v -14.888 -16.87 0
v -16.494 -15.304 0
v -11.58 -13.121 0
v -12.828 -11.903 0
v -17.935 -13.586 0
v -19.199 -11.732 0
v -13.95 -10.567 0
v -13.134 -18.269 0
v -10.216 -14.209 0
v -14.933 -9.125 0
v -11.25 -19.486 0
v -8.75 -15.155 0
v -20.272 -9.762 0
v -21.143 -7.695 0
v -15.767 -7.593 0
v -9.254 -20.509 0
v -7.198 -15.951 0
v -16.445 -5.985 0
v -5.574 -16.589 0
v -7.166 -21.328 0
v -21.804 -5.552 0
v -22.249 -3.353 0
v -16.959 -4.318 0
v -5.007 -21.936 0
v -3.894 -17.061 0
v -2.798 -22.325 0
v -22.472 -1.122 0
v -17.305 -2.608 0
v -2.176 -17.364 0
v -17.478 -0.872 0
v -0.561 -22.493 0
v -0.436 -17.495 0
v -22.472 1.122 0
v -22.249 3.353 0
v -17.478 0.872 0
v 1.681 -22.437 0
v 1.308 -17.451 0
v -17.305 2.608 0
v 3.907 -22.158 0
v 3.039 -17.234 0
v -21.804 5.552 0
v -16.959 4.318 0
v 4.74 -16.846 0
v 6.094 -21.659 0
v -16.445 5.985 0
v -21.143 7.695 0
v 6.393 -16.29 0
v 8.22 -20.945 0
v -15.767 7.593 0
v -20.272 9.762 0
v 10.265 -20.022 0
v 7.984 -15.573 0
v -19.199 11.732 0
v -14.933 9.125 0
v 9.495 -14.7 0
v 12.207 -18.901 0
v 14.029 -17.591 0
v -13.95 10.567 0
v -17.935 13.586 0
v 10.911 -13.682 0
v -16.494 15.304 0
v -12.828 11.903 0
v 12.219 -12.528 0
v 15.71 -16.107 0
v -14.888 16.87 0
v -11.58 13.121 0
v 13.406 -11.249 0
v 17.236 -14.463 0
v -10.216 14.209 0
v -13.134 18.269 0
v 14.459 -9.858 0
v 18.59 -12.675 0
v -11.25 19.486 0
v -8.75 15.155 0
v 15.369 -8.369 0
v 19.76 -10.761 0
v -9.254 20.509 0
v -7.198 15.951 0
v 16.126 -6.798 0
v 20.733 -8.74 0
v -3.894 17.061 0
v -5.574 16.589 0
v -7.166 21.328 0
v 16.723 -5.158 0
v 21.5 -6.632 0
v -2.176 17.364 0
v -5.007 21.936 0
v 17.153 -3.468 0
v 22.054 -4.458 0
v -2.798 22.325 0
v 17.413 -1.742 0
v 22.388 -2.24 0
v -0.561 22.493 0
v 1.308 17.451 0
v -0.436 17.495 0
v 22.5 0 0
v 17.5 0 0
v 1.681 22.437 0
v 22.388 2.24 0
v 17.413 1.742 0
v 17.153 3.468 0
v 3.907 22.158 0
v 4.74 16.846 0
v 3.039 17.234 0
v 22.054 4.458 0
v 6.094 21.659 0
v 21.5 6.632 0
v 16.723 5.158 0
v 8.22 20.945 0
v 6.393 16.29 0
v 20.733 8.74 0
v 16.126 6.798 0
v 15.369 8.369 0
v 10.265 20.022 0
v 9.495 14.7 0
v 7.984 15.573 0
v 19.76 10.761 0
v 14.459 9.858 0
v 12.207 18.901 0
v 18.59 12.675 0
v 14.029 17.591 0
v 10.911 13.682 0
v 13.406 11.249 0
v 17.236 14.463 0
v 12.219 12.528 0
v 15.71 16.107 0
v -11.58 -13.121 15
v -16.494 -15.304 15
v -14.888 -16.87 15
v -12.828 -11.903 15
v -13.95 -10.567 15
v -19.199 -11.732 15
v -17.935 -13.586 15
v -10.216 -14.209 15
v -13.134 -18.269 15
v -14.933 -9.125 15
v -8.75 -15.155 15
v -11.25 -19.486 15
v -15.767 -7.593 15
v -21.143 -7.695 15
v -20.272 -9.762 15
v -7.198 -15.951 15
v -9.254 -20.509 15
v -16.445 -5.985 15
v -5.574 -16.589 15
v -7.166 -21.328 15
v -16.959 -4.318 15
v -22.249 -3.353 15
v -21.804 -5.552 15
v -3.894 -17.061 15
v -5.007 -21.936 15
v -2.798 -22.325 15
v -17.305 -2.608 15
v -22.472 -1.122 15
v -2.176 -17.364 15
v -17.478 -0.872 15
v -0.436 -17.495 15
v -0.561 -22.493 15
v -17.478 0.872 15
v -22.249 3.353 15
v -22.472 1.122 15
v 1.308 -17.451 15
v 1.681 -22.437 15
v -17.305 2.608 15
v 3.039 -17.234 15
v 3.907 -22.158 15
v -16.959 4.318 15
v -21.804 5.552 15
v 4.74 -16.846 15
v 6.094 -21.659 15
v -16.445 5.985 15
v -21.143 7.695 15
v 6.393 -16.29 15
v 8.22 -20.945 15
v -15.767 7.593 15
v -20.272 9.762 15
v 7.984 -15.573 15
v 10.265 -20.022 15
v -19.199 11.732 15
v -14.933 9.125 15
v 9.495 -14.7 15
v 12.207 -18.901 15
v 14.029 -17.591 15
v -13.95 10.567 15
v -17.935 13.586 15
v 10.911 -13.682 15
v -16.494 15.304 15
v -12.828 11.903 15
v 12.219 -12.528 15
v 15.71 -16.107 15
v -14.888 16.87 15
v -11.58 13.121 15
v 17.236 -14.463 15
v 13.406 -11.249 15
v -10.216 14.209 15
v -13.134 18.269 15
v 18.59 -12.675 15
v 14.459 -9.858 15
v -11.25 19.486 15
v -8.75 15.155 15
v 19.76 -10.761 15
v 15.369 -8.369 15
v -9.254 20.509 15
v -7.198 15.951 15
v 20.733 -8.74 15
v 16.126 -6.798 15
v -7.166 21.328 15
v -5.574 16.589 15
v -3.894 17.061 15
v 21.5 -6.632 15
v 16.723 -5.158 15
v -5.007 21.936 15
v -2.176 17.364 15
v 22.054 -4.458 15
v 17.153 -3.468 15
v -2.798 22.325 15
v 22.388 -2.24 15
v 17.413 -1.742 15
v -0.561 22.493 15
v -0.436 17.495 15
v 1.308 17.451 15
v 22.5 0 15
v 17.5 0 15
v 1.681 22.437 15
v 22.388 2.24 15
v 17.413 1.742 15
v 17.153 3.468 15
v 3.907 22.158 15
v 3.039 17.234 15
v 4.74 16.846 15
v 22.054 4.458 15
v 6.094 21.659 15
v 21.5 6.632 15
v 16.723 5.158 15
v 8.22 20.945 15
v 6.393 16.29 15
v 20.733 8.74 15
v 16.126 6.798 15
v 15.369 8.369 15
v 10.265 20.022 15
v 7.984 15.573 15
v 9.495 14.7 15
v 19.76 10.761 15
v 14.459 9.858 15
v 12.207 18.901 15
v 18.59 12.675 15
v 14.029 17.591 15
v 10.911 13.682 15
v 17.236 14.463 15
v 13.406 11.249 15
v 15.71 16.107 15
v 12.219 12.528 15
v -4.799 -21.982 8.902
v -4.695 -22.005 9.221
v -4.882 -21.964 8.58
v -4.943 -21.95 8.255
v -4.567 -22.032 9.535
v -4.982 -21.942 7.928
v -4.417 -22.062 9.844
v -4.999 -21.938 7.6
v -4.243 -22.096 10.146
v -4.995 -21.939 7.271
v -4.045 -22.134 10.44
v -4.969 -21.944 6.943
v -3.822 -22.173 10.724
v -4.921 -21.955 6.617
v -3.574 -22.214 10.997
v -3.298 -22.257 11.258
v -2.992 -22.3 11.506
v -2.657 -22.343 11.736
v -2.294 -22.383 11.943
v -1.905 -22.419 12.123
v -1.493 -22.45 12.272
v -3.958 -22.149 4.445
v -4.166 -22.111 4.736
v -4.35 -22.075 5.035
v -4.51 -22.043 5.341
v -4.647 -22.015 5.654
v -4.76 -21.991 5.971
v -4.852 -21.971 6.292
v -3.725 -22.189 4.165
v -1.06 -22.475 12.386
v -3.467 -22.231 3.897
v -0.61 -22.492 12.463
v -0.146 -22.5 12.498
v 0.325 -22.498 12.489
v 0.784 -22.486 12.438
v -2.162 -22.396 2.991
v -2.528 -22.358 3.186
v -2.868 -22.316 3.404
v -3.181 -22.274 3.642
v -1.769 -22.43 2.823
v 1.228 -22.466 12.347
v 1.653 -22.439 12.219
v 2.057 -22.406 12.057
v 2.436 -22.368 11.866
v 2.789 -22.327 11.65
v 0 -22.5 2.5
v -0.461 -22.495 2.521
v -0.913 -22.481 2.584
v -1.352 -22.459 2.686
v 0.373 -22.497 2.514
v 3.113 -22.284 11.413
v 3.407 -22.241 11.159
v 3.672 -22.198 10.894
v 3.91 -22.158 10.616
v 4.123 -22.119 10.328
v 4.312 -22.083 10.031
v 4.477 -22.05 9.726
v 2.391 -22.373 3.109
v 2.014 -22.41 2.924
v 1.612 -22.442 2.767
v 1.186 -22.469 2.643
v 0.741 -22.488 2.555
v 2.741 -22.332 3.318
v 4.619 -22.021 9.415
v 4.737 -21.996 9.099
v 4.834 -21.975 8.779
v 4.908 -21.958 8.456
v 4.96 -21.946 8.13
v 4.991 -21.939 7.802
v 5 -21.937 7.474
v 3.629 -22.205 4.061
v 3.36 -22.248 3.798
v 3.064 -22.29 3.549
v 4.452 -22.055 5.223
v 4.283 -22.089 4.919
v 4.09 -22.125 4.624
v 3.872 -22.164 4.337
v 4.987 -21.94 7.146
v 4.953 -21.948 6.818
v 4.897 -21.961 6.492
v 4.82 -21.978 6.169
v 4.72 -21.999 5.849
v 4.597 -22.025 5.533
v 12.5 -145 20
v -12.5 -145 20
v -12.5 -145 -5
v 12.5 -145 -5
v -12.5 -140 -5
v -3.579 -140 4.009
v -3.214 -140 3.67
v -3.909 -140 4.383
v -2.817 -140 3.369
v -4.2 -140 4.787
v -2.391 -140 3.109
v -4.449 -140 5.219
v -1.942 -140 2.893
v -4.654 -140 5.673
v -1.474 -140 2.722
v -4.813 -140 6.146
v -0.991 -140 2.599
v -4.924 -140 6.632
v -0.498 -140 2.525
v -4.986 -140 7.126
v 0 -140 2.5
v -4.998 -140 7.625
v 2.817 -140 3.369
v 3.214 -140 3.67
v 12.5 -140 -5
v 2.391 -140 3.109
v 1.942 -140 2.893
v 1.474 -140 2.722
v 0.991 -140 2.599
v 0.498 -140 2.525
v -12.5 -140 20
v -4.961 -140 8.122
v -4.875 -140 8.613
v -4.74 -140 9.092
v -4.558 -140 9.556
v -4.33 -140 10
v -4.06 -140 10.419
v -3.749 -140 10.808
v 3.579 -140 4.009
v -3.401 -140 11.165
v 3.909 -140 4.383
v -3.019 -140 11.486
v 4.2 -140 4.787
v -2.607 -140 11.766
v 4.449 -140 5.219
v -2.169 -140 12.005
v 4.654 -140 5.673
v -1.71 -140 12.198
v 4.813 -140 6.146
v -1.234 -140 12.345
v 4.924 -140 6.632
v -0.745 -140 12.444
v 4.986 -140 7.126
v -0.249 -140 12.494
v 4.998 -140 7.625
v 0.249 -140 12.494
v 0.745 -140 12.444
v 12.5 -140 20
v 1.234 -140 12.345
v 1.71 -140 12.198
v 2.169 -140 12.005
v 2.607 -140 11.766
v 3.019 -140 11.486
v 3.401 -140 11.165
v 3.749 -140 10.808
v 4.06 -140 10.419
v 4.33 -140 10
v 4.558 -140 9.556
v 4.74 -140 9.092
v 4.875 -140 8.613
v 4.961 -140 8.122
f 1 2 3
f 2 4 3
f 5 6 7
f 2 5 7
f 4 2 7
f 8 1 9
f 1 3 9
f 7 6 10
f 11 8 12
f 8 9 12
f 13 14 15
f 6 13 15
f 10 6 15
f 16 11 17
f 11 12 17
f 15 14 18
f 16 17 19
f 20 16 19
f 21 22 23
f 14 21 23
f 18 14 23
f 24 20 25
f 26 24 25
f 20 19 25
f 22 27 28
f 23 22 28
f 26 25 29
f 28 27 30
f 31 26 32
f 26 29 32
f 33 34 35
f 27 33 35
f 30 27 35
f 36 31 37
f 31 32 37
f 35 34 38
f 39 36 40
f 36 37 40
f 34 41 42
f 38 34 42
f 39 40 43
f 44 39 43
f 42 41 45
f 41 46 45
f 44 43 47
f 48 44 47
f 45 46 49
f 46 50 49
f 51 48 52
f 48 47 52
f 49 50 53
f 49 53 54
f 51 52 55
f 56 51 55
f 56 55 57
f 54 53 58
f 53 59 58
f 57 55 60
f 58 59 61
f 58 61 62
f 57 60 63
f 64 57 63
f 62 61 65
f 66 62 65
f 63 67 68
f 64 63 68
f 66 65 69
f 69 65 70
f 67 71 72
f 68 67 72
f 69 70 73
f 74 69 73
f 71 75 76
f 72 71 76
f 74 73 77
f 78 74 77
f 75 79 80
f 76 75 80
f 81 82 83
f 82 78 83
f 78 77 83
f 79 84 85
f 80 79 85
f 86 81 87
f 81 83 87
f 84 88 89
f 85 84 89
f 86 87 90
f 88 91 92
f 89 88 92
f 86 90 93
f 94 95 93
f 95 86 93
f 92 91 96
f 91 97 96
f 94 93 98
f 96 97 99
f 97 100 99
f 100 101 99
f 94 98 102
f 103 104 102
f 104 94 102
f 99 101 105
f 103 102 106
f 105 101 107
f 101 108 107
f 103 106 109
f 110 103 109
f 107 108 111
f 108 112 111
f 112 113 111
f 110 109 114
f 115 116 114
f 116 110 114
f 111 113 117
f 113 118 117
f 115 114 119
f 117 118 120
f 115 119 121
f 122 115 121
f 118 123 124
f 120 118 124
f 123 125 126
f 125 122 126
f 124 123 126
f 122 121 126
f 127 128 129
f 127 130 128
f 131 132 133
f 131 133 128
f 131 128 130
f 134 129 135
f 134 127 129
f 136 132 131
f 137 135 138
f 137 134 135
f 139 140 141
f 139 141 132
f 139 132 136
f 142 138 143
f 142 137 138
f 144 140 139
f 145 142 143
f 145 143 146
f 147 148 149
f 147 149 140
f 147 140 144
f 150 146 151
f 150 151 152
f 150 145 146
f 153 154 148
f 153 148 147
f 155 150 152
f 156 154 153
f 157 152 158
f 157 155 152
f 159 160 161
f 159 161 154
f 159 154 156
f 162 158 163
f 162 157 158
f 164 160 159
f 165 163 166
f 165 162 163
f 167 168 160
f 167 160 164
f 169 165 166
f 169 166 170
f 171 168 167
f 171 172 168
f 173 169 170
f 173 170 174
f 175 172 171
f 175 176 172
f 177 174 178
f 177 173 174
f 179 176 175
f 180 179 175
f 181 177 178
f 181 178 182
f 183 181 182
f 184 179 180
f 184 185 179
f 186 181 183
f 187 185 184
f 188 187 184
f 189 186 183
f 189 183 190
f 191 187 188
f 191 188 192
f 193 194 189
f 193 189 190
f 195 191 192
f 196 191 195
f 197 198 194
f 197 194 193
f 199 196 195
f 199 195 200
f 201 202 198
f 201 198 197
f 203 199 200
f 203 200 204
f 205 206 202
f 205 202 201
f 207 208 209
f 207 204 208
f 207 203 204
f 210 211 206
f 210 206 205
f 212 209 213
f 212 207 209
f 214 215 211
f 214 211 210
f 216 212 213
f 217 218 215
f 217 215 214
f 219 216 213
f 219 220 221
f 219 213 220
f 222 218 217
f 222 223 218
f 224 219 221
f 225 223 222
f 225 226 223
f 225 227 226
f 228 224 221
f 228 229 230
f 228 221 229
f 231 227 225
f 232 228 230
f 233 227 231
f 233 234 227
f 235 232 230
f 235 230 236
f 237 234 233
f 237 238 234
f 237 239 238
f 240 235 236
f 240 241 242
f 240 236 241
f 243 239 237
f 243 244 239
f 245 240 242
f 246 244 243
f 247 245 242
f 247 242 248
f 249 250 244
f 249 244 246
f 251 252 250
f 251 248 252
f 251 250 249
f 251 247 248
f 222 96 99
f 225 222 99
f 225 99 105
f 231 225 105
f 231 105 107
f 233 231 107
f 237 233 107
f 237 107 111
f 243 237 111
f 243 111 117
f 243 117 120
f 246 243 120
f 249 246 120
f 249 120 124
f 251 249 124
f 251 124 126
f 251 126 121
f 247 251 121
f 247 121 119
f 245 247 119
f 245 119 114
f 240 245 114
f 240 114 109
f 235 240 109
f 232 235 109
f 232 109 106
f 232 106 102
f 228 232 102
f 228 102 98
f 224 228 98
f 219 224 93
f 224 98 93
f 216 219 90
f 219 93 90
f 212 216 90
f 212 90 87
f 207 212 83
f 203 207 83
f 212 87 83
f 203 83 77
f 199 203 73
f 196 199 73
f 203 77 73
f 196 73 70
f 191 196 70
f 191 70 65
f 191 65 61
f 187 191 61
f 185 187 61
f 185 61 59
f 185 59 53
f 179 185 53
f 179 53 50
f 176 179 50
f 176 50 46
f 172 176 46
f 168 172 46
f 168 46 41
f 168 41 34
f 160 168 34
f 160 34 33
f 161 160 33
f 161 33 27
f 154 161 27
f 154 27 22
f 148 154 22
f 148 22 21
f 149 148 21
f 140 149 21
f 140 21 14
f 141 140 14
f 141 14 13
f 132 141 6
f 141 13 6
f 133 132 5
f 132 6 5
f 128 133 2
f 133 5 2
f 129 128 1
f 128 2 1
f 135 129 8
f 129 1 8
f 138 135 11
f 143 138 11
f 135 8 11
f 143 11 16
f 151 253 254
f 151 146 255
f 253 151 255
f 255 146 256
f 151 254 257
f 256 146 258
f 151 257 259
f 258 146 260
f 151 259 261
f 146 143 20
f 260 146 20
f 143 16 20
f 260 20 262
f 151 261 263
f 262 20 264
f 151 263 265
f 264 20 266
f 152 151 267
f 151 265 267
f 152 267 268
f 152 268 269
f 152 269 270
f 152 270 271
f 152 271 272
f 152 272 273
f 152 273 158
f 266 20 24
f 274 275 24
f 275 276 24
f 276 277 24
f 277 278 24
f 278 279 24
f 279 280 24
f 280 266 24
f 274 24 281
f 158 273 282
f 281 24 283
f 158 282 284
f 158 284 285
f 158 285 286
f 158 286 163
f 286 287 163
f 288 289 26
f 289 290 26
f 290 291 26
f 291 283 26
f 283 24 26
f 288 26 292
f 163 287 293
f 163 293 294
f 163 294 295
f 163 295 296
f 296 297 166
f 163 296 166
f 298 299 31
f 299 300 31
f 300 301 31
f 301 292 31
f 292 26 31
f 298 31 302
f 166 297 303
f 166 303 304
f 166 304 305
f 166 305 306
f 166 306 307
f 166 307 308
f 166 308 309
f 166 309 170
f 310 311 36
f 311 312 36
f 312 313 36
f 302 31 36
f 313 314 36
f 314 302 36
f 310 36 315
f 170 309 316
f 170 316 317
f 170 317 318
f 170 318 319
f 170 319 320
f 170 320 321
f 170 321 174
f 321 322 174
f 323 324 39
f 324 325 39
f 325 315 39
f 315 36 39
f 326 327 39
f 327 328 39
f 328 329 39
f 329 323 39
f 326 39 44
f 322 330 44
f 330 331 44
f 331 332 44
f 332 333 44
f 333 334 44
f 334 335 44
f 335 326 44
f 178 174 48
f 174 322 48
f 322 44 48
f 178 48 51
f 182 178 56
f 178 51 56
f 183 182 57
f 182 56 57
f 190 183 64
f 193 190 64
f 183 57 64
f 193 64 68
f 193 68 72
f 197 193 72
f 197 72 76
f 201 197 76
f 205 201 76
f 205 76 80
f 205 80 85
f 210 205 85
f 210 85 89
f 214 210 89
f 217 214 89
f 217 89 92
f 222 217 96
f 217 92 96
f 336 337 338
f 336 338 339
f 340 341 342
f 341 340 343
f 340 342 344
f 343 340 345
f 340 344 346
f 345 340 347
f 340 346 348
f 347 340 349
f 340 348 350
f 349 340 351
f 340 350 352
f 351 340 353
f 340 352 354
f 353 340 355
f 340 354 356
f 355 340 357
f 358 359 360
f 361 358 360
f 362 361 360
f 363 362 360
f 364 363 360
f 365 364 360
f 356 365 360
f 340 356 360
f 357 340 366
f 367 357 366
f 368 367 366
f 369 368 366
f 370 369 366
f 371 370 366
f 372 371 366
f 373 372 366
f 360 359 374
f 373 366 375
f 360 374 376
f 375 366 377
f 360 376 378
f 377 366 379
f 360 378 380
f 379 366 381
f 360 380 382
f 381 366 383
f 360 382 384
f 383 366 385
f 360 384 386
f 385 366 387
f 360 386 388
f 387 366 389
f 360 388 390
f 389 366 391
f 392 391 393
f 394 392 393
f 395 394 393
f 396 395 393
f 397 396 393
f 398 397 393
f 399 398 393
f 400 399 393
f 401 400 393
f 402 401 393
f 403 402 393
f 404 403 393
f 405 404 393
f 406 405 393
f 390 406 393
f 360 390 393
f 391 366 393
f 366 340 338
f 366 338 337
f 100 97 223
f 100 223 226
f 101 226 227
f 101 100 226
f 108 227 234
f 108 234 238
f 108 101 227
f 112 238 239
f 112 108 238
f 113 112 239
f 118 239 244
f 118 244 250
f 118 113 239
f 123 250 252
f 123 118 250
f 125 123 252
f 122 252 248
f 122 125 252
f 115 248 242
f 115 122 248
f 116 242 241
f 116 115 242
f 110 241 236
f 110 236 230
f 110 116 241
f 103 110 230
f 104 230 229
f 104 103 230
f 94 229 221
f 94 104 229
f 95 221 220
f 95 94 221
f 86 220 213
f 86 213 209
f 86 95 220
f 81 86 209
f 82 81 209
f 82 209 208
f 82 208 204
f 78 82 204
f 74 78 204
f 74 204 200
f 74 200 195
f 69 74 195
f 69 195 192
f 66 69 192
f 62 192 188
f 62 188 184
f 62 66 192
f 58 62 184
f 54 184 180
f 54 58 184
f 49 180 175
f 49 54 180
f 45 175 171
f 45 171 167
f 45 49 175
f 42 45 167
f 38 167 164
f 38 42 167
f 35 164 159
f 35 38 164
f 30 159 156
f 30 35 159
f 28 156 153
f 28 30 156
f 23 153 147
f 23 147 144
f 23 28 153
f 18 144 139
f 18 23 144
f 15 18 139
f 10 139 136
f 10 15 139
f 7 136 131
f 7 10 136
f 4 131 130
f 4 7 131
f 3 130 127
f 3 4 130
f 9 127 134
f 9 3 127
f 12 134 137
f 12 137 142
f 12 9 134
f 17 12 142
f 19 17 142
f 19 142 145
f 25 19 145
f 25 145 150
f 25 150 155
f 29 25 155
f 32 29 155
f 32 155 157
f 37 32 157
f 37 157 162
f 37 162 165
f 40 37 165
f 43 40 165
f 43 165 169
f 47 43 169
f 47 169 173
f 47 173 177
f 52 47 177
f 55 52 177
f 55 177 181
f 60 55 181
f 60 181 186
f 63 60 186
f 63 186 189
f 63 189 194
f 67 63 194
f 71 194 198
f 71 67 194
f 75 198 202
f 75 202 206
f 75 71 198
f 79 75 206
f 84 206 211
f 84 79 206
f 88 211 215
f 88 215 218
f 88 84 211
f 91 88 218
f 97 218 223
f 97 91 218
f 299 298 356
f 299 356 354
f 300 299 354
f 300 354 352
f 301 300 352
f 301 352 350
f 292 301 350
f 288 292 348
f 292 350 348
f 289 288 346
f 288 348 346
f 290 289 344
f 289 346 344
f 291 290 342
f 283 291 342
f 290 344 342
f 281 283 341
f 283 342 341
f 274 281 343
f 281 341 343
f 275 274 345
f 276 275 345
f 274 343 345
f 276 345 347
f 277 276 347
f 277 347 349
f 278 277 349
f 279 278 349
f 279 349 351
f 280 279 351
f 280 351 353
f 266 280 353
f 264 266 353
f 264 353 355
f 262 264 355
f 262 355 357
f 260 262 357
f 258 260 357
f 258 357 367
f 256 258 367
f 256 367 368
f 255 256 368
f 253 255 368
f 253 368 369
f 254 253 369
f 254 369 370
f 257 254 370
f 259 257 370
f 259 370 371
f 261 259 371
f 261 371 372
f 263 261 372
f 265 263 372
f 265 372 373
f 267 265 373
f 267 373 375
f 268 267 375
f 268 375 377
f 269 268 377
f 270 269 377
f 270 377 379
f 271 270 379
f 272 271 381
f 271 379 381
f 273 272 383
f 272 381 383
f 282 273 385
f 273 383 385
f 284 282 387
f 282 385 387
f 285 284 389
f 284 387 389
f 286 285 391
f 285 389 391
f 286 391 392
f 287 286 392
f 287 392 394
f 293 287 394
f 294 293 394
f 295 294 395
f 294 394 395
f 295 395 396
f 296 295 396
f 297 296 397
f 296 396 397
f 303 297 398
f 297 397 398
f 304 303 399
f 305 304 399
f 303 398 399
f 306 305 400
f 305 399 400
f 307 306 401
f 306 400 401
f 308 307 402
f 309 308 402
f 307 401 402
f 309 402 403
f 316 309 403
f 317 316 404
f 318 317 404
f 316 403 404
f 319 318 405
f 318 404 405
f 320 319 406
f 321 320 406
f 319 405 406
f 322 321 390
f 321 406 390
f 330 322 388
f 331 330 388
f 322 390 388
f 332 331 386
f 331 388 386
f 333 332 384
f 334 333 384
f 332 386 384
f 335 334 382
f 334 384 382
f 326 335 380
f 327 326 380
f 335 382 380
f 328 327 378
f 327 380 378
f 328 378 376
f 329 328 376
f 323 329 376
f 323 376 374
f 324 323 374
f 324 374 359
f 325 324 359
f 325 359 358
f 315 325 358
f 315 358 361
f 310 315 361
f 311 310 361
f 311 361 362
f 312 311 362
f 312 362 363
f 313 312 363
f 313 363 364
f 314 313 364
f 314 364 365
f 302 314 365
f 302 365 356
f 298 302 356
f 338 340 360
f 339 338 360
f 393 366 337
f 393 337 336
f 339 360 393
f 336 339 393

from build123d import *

# Parameters (mm, degrees)
SKETCH_1_R           = 22.5
SKETCH_1_R_2         = 17.5
EXTRUDE_1_DEPTH      = 15
EXTRUDE_2_REACH      = 166.735
EXTRUDE_2_END_RADIUS = 22.5
SKETCH_2_R           = 5
SKETCH_3_W           = 25
SKETCH_3_H           = 25
EXTRUDE_3_DEPTH      = 5


with BuildPart() as part:
    # 草图1 → 凸台-拉伸1 (new body)
    with BuildSketch(Plane.XY):
        Circle(SKETCH_1_R)
        Circle(SKETCH_1_R_2, mode=Mode.SUBTRACT)
    extrude(amount=EXTRUDE_1_DEPTH)

    # 凸台-拉伸2: up to this cylinder (the profile starts outside it)
    extrude_2_end = Plane(origin=(0, 0, 7.5), z_dir=(0, 0, -1)) * Cylinder(EXTRUDE_2_END_RADIUS, 379.47, mode=Mode.PRIVATE)
    # 草图2 → 凸台-拉伸2 (add, up to the surface)
    with BuildSketch(Plane(origin=(0, -140, 0), x_dir=(1, 0, 0), z_dir=(0, 1, 0)), mode=Mode.PRIVATE) as extrude_2_sk1:
        with Locations(Location((0, -7.5, 0), (0, 0, 90))):
            Circle(SKETCH_2_R)
    extrude_2_tool1 = extrude(extrude_2_sk1.sketch, amount=EXTRUDE_2_REACH, mode=Mode.PRIVATE) - extrude_2_end
    add(extrude_2_tool1.solids().sort_by_distance((0, -140, 7.5))[0])

    # 草图3 → 凸台-拉伸3 (add)
    with BuildSketch(Plane.XZ.offset(140)):
        with Locations((0, 7.5)):
            Rectangle(SKETCH_3_W, SKETCH_3_H)
    extrude(amount=EXTRUDE_3_DEPTH)


solid = part.part
